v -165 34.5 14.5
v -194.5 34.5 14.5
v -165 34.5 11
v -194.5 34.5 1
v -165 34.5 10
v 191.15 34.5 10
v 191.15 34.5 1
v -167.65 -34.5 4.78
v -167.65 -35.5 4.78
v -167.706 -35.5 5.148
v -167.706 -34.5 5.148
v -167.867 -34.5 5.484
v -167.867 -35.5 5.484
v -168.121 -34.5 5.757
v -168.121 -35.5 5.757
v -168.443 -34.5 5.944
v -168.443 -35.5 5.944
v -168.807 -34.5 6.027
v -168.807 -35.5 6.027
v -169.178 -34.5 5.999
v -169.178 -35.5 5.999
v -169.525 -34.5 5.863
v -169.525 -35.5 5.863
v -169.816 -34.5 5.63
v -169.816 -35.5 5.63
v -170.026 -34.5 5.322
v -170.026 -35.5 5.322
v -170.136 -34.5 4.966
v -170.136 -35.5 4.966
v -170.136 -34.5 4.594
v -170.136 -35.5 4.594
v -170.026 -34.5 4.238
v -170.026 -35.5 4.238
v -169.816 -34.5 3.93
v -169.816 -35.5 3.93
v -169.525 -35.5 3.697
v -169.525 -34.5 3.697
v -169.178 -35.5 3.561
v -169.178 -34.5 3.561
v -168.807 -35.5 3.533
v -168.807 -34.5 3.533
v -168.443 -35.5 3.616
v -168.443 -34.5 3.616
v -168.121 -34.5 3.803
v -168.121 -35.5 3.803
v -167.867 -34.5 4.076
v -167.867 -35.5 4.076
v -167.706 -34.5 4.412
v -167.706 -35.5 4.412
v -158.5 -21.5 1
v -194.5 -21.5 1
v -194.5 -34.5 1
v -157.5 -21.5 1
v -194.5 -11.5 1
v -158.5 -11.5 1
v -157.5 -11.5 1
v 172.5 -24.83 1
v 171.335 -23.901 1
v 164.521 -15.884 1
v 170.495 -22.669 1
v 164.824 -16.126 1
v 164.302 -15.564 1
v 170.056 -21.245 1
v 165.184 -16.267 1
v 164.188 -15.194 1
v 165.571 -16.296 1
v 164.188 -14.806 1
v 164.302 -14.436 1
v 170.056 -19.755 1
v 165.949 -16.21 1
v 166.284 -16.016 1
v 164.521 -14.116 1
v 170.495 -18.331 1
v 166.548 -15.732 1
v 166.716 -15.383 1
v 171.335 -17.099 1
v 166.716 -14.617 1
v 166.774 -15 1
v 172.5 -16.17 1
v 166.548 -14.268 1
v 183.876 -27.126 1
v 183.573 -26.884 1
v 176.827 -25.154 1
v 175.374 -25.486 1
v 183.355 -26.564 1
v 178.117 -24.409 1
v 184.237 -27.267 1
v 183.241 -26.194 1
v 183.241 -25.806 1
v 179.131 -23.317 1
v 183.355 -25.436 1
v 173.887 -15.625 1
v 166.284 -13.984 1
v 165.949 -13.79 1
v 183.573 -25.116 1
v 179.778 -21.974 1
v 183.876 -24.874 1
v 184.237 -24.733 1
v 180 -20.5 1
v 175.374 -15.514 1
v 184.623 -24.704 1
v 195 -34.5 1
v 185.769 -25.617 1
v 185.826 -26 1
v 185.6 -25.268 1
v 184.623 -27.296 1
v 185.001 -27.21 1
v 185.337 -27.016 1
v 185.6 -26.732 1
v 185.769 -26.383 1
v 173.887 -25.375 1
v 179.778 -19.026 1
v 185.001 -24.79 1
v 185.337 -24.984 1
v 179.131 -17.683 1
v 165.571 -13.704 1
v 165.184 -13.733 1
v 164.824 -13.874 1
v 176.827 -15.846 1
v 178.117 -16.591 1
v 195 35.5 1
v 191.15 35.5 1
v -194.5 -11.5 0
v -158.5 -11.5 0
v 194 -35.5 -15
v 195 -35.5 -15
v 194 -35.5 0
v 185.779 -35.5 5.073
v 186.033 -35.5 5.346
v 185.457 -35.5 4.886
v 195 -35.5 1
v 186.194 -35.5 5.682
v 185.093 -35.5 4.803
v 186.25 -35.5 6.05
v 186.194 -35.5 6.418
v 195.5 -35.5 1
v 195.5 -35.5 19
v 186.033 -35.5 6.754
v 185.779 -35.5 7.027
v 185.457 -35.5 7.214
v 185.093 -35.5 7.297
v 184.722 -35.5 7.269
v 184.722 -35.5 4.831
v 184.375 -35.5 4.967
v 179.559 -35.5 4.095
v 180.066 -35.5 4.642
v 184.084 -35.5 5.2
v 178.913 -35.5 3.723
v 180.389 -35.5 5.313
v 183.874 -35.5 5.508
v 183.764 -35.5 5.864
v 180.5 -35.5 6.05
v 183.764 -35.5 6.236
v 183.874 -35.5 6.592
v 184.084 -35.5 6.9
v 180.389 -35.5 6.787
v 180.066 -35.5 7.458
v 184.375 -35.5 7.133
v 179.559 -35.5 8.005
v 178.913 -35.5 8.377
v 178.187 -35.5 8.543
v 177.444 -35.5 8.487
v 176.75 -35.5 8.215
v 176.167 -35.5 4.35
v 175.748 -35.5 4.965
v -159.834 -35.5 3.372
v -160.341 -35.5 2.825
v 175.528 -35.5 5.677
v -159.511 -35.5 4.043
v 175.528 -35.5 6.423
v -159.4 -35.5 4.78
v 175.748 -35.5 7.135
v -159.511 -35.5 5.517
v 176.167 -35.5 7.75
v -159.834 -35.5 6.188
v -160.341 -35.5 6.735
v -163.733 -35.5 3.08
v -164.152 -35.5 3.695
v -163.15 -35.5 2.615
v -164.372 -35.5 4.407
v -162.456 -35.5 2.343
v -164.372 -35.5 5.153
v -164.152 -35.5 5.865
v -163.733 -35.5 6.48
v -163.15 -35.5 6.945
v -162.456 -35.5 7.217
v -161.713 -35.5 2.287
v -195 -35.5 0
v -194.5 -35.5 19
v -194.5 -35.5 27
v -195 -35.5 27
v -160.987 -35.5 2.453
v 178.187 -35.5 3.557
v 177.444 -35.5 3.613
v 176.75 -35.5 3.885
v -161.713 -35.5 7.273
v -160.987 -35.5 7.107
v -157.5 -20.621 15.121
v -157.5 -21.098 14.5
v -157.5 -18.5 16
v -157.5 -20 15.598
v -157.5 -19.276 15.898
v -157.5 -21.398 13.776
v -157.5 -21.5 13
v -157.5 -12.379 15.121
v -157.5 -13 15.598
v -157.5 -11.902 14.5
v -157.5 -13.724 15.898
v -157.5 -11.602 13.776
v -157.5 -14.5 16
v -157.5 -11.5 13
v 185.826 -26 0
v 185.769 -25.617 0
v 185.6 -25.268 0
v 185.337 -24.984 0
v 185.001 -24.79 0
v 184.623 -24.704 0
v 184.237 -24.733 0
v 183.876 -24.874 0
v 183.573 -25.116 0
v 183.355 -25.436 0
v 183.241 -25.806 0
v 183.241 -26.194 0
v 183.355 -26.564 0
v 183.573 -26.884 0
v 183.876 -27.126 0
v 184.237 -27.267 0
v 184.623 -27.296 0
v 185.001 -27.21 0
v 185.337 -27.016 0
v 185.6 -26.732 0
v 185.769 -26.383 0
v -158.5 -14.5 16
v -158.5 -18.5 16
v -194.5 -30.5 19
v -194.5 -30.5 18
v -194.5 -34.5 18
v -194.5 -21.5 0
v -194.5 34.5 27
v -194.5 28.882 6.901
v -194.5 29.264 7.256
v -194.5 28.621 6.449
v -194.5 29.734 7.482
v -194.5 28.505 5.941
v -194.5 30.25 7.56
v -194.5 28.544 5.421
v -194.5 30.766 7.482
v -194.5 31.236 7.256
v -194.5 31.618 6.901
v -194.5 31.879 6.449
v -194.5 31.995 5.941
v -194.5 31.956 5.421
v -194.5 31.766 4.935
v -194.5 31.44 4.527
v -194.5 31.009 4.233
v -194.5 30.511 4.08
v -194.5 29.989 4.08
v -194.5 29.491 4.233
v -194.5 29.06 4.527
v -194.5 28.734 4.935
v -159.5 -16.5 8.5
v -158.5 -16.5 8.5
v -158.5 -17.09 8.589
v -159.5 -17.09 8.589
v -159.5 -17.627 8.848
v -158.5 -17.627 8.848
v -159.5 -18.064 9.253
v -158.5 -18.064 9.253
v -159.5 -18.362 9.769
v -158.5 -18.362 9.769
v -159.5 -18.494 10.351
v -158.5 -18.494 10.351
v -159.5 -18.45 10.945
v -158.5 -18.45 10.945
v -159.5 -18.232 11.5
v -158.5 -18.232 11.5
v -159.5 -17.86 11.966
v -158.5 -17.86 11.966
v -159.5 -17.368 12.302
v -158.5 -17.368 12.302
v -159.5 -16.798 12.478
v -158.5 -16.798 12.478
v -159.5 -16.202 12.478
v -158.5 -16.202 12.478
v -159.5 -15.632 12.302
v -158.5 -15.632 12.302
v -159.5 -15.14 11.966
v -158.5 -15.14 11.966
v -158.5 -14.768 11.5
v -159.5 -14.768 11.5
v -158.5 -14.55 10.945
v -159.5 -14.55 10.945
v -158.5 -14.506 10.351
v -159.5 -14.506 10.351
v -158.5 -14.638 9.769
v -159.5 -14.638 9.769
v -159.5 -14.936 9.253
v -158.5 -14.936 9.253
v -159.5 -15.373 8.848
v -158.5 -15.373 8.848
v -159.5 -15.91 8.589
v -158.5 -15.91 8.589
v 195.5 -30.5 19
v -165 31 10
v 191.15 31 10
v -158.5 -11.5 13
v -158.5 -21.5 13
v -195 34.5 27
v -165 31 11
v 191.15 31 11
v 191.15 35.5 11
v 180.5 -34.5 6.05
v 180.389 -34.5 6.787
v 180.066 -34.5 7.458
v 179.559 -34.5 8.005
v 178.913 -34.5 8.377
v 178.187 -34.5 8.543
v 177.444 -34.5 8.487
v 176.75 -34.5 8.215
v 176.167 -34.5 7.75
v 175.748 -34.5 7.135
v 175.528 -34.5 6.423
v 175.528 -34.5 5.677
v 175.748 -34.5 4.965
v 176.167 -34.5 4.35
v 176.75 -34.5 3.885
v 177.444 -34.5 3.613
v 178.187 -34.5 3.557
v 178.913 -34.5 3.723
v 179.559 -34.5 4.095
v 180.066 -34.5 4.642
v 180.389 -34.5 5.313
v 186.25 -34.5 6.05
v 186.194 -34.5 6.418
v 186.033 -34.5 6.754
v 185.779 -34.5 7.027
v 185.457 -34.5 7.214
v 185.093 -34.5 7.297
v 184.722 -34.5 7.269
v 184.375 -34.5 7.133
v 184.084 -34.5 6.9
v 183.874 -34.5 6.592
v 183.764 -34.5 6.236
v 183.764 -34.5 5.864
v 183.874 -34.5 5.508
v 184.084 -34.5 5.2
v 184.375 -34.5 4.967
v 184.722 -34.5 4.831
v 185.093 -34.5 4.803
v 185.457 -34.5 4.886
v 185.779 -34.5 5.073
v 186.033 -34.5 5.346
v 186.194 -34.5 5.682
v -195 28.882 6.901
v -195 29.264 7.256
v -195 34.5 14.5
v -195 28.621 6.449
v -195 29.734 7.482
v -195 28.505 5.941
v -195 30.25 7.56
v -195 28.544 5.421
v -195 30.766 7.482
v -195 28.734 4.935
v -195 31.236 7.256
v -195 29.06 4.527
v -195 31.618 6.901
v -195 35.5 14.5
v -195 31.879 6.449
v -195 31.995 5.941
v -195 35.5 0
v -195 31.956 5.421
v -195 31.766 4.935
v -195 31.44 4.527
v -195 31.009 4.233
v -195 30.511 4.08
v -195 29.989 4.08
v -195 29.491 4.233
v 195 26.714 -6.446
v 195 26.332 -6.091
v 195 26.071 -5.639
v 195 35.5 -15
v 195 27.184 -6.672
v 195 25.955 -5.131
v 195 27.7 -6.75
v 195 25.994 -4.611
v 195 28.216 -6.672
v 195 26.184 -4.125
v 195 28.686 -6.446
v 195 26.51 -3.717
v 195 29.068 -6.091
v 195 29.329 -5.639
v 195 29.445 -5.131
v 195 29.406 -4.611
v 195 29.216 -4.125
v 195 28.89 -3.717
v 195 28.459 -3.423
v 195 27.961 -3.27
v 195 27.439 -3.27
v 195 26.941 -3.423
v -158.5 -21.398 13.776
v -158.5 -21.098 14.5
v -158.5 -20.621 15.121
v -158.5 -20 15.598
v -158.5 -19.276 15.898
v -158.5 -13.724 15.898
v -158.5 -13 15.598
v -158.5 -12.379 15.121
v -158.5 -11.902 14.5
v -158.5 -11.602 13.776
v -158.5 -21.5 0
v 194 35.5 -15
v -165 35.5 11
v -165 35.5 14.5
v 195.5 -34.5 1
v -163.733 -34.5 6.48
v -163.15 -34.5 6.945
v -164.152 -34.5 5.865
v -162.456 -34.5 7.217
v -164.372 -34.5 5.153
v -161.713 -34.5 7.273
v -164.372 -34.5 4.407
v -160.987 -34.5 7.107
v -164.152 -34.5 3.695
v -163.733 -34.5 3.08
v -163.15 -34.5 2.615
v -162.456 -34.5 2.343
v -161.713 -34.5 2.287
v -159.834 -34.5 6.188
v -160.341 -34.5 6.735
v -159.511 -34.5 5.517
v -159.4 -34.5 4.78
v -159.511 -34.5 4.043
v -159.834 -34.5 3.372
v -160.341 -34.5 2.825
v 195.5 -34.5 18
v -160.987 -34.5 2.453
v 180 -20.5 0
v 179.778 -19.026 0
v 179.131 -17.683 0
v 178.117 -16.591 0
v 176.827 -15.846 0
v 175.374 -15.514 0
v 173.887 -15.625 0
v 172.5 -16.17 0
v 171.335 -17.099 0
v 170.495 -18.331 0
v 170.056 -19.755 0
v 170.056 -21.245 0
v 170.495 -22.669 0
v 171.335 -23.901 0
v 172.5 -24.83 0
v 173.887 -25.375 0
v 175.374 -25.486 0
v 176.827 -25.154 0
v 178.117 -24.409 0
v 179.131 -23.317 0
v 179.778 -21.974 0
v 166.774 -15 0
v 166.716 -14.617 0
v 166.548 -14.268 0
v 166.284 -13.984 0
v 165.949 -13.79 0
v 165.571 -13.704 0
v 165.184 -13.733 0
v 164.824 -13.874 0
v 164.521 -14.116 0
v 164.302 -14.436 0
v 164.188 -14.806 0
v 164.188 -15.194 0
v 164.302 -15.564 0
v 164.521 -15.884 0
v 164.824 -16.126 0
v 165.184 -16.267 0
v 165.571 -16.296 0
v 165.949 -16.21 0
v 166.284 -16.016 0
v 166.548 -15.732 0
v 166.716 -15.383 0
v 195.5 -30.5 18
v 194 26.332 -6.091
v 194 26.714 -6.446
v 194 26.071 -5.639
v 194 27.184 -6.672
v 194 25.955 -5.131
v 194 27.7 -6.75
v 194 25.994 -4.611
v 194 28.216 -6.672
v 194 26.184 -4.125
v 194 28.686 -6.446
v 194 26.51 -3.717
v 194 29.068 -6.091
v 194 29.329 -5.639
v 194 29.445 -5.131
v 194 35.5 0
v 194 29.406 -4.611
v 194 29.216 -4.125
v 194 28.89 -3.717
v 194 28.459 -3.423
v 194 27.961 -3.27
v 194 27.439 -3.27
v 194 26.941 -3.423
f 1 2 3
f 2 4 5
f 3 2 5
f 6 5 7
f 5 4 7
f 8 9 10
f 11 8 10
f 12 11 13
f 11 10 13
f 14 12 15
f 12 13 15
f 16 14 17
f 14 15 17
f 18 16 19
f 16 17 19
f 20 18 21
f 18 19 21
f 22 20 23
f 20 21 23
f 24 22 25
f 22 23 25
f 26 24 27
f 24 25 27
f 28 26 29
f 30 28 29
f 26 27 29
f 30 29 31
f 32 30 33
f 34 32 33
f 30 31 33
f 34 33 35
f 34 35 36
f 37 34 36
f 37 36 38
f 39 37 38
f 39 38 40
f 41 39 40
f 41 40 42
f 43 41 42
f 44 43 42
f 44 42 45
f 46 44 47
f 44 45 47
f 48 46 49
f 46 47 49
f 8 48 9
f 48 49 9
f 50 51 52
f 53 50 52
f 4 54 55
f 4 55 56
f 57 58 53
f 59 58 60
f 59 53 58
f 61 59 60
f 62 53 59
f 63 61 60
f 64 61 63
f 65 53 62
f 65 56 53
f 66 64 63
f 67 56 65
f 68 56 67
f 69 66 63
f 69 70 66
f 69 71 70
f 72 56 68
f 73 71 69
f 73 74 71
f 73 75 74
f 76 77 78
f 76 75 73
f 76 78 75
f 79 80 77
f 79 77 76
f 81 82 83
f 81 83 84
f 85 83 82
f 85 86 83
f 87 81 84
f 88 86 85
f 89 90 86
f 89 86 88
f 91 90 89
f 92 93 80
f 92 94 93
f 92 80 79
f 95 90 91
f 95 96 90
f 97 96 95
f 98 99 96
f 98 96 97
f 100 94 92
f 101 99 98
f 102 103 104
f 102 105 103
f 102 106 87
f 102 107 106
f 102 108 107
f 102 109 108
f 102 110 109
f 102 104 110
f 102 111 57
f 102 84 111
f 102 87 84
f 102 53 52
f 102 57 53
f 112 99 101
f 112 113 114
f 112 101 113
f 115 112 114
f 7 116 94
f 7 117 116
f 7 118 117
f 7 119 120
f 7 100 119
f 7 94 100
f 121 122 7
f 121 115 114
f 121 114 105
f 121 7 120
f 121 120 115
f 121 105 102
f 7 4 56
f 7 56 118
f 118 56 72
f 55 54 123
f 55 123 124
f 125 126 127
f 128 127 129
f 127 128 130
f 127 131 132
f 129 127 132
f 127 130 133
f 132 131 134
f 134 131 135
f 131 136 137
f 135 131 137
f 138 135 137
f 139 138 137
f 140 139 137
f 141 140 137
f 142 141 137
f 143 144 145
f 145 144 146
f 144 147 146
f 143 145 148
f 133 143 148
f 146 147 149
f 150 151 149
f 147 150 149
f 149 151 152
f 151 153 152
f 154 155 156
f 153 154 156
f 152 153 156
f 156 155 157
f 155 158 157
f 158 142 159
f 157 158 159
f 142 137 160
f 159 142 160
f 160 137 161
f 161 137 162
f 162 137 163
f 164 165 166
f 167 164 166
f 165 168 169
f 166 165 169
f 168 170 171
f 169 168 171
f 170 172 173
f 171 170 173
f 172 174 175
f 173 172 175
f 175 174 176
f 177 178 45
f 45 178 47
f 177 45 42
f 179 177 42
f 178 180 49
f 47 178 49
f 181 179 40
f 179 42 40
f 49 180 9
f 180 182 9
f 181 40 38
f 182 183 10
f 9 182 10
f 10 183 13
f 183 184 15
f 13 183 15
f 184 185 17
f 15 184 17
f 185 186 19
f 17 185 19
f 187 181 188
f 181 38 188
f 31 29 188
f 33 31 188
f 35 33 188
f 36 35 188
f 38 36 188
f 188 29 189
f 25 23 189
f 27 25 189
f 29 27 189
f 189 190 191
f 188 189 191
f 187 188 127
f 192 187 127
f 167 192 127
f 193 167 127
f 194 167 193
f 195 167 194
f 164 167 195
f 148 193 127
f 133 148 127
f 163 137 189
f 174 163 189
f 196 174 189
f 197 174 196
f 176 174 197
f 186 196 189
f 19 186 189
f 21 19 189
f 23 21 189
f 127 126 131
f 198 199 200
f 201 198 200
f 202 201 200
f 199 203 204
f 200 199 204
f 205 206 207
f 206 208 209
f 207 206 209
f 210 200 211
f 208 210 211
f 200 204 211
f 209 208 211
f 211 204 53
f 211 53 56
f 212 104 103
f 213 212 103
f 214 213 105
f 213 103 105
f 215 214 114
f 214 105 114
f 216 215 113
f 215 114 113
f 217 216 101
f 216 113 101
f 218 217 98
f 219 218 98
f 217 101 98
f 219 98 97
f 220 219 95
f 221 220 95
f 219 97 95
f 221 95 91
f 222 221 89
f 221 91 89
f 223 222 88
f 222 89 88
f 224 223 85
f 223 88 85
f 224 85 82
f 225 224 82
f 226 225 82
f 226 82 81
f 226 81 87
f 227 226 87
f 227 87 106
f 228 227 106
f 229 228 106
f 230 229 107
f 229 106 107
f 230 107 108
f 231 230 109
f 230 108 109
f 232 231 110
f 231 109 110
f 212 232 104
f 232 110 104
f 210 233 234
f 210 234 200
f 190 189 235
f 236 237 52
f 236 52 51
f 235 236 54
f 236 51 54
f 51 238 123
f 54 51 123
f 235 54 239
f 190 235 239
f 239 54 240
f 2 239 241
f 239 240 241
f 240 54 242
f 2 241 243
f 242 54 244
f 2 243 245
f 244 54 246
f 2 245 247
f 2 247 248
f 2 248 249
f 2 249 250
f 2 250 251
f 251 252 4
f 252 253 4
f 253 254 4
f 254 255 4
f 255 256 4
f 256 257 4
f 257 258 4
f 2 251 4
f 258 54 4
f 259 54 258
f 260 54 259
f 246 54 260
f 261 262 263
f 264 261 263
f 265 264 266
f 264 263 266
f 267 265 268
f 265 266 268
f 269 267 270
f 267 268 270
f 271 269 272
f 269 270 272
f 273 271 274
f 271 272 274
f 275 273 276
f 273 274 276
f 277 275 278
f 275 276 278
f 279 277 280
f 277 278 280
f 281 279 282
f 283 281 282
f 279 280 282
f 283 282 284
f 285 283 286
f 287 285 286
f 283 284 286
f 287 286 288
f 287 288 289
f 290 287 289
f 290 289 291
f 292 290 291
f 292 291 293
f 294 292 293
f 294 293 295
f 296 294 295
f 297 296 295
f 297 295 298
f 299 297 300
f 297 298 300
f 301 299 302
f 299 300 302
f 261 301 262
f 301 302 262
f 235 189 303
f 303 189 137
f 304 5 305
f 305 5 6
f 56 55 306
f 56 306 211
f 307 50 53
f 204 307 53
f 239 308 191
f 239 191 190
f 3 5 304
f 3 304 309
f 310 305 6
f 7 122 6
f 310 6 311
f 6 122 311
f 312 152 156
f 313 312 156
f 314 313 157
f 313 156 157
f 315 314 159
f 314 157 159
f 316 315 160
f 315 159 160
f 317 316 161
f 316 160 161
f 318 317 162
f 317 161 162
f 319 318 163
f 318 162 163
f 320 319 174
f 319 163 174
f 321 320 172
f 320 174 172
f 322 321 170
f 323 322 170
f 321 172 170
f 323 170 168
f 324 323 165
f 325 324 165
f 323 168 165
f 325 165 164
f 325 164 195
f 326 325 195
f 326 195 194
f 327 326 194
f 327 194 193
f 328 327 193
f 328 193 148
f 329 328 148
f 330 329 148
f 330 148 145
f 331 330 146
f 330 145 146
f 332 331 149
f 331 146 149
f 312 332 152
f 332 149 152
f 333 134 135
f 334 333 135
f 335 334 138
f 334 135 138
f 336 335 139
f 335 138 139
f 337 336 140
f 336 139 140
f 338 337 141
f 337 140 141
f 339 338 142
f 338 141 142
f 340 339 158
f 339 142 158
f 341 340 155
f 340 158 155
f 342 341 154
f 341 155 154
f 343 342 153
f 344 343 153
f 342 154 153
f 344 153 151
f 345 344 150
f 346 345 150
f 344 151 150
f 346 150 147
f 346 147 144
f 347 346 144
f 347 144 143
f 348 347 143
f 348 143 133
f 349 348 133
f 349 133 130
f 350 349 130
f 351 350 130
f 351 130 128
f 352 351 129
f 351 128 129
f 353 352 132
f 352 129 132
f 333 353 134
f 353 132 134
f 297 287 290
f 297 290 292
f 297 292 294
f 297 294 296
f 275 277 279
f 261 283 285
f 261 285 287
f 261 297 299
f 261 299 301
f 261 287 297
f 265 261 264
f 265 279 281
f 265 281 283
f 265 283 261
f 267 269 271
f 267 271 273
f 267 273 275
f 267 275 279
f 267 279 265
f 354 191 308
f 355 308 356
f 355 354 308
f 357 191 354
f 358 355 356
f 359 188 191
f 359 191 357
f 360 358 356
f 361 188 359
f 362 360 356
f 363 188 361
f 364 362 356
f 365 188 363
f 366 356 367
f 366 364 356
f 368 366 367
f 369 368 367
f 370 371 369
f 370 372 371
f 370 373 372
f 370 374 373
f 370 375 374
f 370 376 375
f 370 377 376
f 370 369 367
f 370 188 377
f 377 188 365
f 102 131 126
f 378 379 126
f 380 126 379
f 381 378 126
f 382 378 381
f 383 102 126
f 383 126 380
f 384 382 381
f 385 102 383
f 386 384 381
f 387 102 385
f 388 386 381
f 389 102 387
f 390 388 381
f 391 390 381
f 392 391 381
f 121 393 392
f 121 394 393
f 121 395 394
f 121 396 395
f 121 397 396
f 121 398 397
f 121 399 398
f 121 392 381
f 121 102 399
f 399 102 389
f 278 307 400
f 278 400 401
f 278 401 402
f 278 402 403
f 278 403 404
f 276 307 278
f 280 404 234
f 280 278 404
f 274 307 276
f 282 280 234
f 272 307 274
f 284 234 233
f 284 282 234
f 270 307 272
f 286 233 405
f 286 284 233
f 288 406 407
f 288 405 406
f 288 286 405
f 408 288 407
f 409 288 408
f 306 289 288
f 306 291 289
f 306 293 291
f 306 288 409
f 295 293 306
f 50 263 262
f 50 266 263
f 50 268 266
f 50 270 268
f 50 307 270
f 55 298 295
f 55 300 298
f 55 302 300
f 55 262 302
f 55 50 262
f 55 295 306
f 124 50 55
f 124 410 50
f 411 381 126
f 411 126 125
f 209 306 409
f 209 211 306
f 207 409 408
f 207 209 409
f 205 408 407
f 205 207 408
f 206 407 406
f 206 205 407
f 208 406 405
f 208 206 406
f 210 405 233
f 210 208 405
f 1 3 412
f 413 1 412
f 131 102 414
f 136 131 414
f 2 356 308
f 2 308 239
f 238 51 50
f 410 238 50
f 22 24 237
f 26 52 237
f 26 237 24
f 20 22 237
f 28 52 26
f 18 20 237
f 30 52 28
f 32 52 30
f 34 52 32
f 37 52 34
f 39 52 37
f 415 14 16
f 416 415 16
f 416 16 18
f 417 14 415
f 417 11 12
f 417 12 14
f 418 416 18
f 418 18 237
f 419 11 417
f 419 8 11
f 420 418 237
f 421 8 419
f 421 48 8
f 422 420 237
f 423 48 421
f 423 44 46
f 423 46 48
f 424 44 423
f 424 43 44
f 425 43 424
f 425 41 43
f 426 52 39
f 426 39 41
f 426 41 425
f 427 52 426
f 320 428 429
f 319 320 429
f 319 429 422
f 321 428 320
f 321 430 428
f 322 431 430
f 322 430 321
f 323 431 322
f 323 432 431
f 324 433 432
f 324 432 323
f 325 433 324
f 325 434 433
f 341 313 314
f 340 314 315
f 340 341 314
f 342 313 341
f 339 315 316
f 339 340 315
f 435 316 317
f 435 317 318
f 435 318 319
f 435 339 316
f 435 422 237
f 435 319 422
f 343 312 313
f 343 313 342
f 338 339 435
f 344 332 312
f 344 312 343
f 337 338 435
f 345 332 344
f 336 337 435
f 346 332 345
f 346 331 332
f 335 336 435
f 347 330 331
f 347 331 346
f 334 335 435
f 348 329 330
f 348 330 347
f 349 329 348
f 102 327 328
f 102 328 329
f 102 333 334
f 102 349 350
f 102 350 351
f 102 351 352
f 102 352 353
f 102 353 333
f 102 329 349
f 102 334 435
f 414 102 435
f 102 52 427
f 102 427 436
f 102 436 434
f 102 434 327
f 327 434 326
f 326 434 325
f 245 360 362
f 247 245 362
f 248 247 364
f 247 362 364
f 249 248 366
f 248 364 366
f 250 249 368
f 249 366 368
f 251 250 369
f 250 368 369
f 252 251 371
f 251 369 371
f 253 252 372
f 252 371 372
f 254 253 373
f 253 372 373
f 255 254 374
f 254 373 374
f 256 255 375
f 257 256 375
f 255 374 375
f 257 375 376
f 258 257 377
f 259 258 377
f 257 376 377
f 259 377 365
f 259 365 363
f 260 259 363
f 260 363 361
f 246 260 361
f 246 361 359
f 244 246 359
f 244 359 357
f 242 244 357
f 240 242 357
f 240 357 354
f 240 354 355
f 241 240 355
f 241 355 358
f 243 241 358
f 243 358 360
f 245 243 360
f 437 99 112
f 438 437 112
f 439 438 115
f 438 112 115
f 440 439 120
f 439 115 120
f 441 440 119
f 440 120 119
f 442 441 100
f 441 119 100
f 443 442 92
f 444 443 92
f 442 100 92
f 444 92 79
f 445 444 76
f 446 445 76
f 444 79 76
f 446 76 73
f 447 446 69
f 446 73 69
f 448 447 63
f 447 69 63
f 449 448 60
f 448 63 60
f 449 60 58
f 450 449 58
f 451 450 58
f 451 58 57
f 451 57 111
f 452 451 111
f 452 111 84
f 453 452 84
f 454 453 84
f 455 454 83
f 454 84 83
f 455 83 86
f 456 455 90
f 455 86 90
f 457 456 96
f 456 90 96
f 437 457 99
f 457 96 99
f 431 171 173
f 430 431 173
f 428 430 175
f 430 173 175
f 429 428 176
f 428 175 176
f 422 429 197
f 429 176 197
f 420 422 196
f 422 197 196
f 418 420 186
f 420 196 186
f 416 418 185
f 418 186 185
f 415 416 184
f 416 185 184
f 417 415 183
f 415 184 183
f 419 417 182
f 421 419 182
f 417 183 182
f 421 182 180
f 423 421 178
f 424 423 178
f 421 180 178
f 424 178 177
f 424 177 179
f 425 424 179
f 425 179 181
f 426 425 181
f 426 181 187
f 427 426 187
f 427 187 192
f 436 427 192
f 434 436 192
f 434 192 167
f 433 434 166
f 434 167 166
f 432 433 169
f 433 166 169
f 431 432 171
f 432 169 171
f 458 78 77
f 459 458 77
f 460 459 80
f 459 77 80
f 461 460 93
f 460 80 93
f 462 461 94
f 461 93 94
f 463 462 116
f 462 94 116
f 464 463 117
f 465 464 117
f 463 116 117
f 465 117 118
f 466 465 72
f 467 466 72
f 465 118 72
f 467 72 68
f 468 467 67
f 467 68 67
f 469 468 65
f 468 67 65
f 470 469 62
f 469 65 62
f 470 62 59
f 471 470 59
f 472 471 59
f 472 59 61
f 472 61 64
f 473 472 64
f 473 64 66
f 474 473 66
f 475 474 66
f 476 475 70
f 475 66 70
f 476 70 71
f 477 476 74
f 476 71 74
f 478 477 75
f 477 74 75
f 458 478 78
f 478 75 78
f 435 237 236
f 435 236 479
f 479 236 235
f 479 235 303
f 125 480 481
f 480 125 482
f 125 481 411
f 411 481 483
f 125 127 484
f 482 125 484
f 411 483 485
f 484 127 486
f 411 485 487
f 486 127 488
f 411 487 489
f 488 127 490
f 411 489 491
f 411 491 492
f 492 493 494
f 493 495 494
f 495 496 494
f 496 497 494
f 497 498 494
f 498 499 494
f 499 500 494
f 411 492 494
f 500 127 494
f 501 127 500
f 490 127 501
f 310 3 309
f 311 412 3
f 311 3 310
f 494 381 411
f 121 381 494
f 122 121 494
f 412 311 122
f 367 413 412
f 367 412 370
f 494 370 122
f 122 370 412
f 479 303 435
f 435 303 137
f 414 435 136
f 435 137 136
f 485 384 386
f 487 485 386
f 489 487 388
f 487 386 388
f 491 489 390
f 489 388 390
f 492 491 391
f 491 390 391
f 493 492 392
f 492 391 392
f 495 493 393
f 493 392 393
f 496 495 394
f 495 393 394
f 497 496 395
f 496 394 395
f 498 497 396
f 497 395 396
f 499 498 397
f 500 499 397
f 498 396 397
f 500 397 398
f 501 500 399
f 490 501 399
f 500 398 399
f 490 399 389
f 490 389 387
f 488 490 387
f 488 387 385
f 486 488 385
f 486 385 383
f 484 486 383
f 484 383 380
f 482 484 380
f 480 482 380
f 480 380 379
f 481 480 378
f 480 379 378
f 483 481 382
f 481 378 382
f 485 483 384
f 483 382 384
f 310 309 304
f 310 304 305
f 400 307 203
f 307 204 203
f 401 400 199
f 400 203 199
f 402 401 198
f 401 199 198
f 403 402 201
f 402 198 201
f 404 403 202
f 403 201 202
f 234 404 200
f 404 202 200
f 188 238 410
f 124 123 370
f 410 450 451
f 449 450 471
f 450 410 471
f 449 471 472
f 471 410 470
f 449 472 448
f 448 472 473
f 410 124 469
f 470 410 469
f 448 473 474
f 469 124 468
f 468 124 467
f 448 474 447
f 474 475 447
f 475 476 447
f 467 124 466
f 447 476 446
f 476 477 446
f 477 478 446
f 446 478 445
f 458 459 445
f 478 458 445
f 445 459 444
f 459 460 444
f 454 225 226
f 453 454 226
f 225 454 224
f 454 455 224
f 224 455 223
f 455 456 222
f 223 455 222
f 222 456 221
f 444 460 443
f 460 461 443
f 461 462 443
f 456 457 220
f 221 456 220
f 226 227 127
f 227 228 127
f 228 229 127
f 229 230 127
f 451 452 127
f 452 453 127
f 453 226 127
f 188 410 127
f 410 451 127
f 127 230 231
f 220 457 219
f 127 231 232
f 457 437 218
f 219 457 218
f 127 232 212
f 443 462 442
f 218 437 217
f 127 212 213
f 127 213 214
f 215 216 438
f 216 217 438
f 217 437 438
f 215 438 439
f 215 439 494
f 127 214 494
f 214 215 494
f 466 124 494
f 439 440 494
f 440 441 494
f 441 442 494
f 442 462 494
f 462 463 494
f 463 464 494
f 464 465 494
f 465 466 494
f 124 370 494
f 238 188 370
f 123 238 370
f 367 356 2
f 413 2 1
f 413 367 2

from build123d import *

# Parameters (mm, degrees)
CROQUIS1_W               = 390
CROQUIS1_H               = 71
SALIENTE_EXTRUIR1_DEPTH  = 1
CROQUIS3_W               = 356.15
CROQUIS3_H               = 1
SALIENTE_EXTRUIR3_DEPTH  = 10
CROQUIS4_W               = 356.15
CROQUIS4_H               = 1
SALIENTE_EXTRUIR4_DEPTH  = 3.5
CROQUIS5_W               = 30
CROQUIS5_H               = 1
SALIENTE_EXTRUIR5_DEPTH  = 13.5
CROQUIS6_W               = 0.5
CROQUIS6_H               = 70
SALIENTE_EXTRUIR6_DEPTH  = 26
CROQUIS7_W               = 390
CROQUIS7_H               = 1
SALIENTE_EXTRUIR7_DEPTH  = 18
CROQUIS8_W               = 390
CROQUIS8_H               = 1
SALIENTE_EXTRUIR8_DEPTH  = 4
CORTAR_EXTRUIR1_REACH    = 202.391
CROQUIS11_W              = 36
CROQUIS11_H              = 10
CROQUIS12_W              = 1
CROQUIS12_H              = 10
SALIENTE_EXTRUIR11_DEPTH = 15
REDONDEO1_R              = 3
CROQUIS13_R              = 2
SALIENTE_EXTRUIR12_DEPTH = 1
CORTAR_EXTRUIR2_REACH    = 395.039
CROQUIS14_R              = 1.75
CROQUIS16_R              = 5
CROQUIS16_R_2            = 1.3
CORTAR_EXTRUIR4_DEPTH    = 1
CROQUIS25_R              = 1.25
CROQUIS25_R_2            = 2.5
CORTAR_EXTRUIR5_DEPTH    = 1
CROQUIS30_W              = 1
CROQUIS30_H              = 71
SALIENTE_EXTRUIR15_DEPTH = 15
CROQUIS31_R              = 1.75
CORTAR_EXTRUIR12_DEPTH   = 1


with BuildPart() as part:
    # Croquis1 → Saliente-Extruir1 (new body)
    with BuildSketch(Plane.XY):
        Rectangle(CROQUIS1_W, CROQUIS1_H)
    extrude(amount=SALIENTE_EXTRUIR1_DEPTH)

    # Croquis3 → Saliente-Extruir3 (add)
    with BuildSketch(Plane.XY.offset(1)):
        with Locations((13.075, 35)):
            Rectangle(CROQUIS3_W, CROQUIS3_H)
    extrude(amount=SALIENTE_EXTRUIR3_DEPTH)

    # Croquis4 → Saliente-Extruir4 (add)
    with BuildSketch(Plane.XZ.offset(-34.5)):
        with Locations((13.075, 10.5)):
            Rectangle(CROQUIS4_W, CROQUIS4_H)
    extrude(amount=SALIENTE_EXTRUIR4_DEPTH)

    # Croquis5 → Saliente-Extruir5 (add)
    with BuildSketch(Plane.XY.offset(1)):
        with Locations((-180, 35)):
            Rectangle(CROQUIS5_W, CROQUIS5_H)
    extrude(amount=SALIENTE_EXTRUIR5_DEPTH)

    # Croquis6 → Saliente-Extruir6 (add)
    with BuildSketch(Plane.XY.offset(1)):
        with Locations((-194.75, -0.5)):
            Rectangle(CROQUIS6_W, CROQUIS6_H)
    extrude(amount=SALIENTE_EXTRUIR6_DEPTH)

    # Croquis7 → Saliente-Extruir7 (add)
    with BuildSketch(Plane.XY.offset(1)):
        with Locations((0.5, -35)):
            Rectangle(CROQUIS7_W, CROQUIS7_H)
    extrude(amount=SALIENTE_EXTRUIR7_DEPTH)

    # Croquis8 → Saliente-Extruir8 (add)
    with BuildSketch(Plane(origin=(0, -34.5, 0), x_dir=(1, 0, 0), z_dir=(0, 1, 0))):
        with Locations((0.5, -18.5)):
            Rectangle(CROQUIS8_W, CROQUIS8_H)
    extrude(amount=SALIENTE_EXTRUIR8_DEPTH)

    # Croquis11 → Cortar-Extruir1 (cut, up to next)
    with BuildSketch(Plane.XY.offset(1), mode=Mode.PRIVATE) as cortar_extruir1_sk1:
        with Locations((-176.5, -16.5)):
            Rectangle(CROQUIS11_W, CROQUIS11_H)
    cortar_extruir1_tool1 = extrude(cortar_extruir1_sk1.sketch, amount=-CORTAR_EXTRUIR1_REACH, mode=Mode.PRIVATE) & part.part
    add(cortar_extruir1_tool1.solids().sort_by_distance((-176.5, -16.5, 1))[0], mode=Mode.SUBTRACT)

    # Croquis12 → Saliente-Extruir11 (add)
    with BuildSketch(Plane.XY.offset(1)):
        with Locations((-158, -16.5)):
            Rectangle(CROQUIS12_W, CROQUIS12_H)
    extrude(amount=SALIENTE_EXTRUIR11_DEPTH)

    # Redondeo1
    redondeo1_edges = [part.edges().sort_by_distance(p)[0] for p in [
        (-158, -21.5, 16),
        (-158, -11.5, 16),
    ]]
    fillet(redondeo1_edges, radius=REDONDEO1_R)

    # Croquis13 → Saliente-Extruir12 (add)
    with BuildSketch(Plane.ZY.offset(158.5)):
        with Locations(Location((10.5, -16.5, 0), (0, 0, 180))):
            Circle(CROQUIS13_R)
    extrude(amount=SALIENTE_EXTRUIR12_DEPTH)

    # Croquis14 → Cortar-Extruir2 (cut, up to next)
    with BuildSketch(Plane.ZY.offset(195), mode=Mode.PRIVATE) as cortar_extruir2_sk1:
        with Locations((5.81, 30.25)):
            Circle(CROQUIS14_R)
    cortar_extruir2_tool1 = extrude(cortar_extruir2_sk1.sketch, amount=-CORTAR_EXTRUIR2_REACH, mode=Mode.PRIVATE) & part.part
    add(cortar_extruir2_tool1.solids().sort_by_distance((-195, 30.25, 5.81))[0], mode=Mode.SUBTRACT)

    # Croquis16 → Cortar-Extruir4 (cut)
    with BuildSketch(Plane.XY.offset(1)):
        with Locations((175, -20.5)):
            Circle(CROQUIS16_R)
        with Locations((184.526279442, -26)):
            Circle(CROQUIS16_R_2)
        with Locations((165.473720558, -15)):
            Circle(CROQUIS16_R_2)
    extrude(amount=-CORTAR_EXTRUIR4_DEPTH, mode=Mode.SUBTRACT)

    # Croquis25 → Cortar-Extruir5 (cut)
    with BuildSketch(Plane.XZ.offset(35.5)):
        with Locations((-168.9, 4.78)):
            Circle(CROQUIS25_R)
        with Locations((-161.9, 4.78)):
            Circle(CROQUIS25_R_2)
        with Locations((185, 6.05)):
            Circle(CROQUIS25_R)
        with Locations((178, 6.05)):
            Circle(CROQUIS25_R_2)
    extrude(amount=-CORTAR_EXTRUIR5_DEPTH, mode=Mode.SUBTRACT)

    # Croquis30 → Saliente-Extruir15 (add)
    with BuildSketch(Plane(origin=(0, 0, 0), x_dir=(-1, 0, 0), z_dir=(0, 0, -1))):
        with Locations((-194.5, 0)):
            Rectangle(CROQUIS30_W, CROQUIS30_H)
    extrude(amount=SALIENTE_EXTRUIR15_DEPTH)

    # Croquis31 → Cortar-Extruir12 (cut)
    with BuildSketch(Plane(origin=(195, 0, 0), x_dir=(0, 0, -1), z_dir=(1, 0, 0))):
        with Locations((5, 27.7)):
            Circle(CROQUIS31_R)
    extrude(amount=-CORTAR_EXTRUIR12_DEPTH, mode=Mode.SUBTRACT)


solid = part.part
